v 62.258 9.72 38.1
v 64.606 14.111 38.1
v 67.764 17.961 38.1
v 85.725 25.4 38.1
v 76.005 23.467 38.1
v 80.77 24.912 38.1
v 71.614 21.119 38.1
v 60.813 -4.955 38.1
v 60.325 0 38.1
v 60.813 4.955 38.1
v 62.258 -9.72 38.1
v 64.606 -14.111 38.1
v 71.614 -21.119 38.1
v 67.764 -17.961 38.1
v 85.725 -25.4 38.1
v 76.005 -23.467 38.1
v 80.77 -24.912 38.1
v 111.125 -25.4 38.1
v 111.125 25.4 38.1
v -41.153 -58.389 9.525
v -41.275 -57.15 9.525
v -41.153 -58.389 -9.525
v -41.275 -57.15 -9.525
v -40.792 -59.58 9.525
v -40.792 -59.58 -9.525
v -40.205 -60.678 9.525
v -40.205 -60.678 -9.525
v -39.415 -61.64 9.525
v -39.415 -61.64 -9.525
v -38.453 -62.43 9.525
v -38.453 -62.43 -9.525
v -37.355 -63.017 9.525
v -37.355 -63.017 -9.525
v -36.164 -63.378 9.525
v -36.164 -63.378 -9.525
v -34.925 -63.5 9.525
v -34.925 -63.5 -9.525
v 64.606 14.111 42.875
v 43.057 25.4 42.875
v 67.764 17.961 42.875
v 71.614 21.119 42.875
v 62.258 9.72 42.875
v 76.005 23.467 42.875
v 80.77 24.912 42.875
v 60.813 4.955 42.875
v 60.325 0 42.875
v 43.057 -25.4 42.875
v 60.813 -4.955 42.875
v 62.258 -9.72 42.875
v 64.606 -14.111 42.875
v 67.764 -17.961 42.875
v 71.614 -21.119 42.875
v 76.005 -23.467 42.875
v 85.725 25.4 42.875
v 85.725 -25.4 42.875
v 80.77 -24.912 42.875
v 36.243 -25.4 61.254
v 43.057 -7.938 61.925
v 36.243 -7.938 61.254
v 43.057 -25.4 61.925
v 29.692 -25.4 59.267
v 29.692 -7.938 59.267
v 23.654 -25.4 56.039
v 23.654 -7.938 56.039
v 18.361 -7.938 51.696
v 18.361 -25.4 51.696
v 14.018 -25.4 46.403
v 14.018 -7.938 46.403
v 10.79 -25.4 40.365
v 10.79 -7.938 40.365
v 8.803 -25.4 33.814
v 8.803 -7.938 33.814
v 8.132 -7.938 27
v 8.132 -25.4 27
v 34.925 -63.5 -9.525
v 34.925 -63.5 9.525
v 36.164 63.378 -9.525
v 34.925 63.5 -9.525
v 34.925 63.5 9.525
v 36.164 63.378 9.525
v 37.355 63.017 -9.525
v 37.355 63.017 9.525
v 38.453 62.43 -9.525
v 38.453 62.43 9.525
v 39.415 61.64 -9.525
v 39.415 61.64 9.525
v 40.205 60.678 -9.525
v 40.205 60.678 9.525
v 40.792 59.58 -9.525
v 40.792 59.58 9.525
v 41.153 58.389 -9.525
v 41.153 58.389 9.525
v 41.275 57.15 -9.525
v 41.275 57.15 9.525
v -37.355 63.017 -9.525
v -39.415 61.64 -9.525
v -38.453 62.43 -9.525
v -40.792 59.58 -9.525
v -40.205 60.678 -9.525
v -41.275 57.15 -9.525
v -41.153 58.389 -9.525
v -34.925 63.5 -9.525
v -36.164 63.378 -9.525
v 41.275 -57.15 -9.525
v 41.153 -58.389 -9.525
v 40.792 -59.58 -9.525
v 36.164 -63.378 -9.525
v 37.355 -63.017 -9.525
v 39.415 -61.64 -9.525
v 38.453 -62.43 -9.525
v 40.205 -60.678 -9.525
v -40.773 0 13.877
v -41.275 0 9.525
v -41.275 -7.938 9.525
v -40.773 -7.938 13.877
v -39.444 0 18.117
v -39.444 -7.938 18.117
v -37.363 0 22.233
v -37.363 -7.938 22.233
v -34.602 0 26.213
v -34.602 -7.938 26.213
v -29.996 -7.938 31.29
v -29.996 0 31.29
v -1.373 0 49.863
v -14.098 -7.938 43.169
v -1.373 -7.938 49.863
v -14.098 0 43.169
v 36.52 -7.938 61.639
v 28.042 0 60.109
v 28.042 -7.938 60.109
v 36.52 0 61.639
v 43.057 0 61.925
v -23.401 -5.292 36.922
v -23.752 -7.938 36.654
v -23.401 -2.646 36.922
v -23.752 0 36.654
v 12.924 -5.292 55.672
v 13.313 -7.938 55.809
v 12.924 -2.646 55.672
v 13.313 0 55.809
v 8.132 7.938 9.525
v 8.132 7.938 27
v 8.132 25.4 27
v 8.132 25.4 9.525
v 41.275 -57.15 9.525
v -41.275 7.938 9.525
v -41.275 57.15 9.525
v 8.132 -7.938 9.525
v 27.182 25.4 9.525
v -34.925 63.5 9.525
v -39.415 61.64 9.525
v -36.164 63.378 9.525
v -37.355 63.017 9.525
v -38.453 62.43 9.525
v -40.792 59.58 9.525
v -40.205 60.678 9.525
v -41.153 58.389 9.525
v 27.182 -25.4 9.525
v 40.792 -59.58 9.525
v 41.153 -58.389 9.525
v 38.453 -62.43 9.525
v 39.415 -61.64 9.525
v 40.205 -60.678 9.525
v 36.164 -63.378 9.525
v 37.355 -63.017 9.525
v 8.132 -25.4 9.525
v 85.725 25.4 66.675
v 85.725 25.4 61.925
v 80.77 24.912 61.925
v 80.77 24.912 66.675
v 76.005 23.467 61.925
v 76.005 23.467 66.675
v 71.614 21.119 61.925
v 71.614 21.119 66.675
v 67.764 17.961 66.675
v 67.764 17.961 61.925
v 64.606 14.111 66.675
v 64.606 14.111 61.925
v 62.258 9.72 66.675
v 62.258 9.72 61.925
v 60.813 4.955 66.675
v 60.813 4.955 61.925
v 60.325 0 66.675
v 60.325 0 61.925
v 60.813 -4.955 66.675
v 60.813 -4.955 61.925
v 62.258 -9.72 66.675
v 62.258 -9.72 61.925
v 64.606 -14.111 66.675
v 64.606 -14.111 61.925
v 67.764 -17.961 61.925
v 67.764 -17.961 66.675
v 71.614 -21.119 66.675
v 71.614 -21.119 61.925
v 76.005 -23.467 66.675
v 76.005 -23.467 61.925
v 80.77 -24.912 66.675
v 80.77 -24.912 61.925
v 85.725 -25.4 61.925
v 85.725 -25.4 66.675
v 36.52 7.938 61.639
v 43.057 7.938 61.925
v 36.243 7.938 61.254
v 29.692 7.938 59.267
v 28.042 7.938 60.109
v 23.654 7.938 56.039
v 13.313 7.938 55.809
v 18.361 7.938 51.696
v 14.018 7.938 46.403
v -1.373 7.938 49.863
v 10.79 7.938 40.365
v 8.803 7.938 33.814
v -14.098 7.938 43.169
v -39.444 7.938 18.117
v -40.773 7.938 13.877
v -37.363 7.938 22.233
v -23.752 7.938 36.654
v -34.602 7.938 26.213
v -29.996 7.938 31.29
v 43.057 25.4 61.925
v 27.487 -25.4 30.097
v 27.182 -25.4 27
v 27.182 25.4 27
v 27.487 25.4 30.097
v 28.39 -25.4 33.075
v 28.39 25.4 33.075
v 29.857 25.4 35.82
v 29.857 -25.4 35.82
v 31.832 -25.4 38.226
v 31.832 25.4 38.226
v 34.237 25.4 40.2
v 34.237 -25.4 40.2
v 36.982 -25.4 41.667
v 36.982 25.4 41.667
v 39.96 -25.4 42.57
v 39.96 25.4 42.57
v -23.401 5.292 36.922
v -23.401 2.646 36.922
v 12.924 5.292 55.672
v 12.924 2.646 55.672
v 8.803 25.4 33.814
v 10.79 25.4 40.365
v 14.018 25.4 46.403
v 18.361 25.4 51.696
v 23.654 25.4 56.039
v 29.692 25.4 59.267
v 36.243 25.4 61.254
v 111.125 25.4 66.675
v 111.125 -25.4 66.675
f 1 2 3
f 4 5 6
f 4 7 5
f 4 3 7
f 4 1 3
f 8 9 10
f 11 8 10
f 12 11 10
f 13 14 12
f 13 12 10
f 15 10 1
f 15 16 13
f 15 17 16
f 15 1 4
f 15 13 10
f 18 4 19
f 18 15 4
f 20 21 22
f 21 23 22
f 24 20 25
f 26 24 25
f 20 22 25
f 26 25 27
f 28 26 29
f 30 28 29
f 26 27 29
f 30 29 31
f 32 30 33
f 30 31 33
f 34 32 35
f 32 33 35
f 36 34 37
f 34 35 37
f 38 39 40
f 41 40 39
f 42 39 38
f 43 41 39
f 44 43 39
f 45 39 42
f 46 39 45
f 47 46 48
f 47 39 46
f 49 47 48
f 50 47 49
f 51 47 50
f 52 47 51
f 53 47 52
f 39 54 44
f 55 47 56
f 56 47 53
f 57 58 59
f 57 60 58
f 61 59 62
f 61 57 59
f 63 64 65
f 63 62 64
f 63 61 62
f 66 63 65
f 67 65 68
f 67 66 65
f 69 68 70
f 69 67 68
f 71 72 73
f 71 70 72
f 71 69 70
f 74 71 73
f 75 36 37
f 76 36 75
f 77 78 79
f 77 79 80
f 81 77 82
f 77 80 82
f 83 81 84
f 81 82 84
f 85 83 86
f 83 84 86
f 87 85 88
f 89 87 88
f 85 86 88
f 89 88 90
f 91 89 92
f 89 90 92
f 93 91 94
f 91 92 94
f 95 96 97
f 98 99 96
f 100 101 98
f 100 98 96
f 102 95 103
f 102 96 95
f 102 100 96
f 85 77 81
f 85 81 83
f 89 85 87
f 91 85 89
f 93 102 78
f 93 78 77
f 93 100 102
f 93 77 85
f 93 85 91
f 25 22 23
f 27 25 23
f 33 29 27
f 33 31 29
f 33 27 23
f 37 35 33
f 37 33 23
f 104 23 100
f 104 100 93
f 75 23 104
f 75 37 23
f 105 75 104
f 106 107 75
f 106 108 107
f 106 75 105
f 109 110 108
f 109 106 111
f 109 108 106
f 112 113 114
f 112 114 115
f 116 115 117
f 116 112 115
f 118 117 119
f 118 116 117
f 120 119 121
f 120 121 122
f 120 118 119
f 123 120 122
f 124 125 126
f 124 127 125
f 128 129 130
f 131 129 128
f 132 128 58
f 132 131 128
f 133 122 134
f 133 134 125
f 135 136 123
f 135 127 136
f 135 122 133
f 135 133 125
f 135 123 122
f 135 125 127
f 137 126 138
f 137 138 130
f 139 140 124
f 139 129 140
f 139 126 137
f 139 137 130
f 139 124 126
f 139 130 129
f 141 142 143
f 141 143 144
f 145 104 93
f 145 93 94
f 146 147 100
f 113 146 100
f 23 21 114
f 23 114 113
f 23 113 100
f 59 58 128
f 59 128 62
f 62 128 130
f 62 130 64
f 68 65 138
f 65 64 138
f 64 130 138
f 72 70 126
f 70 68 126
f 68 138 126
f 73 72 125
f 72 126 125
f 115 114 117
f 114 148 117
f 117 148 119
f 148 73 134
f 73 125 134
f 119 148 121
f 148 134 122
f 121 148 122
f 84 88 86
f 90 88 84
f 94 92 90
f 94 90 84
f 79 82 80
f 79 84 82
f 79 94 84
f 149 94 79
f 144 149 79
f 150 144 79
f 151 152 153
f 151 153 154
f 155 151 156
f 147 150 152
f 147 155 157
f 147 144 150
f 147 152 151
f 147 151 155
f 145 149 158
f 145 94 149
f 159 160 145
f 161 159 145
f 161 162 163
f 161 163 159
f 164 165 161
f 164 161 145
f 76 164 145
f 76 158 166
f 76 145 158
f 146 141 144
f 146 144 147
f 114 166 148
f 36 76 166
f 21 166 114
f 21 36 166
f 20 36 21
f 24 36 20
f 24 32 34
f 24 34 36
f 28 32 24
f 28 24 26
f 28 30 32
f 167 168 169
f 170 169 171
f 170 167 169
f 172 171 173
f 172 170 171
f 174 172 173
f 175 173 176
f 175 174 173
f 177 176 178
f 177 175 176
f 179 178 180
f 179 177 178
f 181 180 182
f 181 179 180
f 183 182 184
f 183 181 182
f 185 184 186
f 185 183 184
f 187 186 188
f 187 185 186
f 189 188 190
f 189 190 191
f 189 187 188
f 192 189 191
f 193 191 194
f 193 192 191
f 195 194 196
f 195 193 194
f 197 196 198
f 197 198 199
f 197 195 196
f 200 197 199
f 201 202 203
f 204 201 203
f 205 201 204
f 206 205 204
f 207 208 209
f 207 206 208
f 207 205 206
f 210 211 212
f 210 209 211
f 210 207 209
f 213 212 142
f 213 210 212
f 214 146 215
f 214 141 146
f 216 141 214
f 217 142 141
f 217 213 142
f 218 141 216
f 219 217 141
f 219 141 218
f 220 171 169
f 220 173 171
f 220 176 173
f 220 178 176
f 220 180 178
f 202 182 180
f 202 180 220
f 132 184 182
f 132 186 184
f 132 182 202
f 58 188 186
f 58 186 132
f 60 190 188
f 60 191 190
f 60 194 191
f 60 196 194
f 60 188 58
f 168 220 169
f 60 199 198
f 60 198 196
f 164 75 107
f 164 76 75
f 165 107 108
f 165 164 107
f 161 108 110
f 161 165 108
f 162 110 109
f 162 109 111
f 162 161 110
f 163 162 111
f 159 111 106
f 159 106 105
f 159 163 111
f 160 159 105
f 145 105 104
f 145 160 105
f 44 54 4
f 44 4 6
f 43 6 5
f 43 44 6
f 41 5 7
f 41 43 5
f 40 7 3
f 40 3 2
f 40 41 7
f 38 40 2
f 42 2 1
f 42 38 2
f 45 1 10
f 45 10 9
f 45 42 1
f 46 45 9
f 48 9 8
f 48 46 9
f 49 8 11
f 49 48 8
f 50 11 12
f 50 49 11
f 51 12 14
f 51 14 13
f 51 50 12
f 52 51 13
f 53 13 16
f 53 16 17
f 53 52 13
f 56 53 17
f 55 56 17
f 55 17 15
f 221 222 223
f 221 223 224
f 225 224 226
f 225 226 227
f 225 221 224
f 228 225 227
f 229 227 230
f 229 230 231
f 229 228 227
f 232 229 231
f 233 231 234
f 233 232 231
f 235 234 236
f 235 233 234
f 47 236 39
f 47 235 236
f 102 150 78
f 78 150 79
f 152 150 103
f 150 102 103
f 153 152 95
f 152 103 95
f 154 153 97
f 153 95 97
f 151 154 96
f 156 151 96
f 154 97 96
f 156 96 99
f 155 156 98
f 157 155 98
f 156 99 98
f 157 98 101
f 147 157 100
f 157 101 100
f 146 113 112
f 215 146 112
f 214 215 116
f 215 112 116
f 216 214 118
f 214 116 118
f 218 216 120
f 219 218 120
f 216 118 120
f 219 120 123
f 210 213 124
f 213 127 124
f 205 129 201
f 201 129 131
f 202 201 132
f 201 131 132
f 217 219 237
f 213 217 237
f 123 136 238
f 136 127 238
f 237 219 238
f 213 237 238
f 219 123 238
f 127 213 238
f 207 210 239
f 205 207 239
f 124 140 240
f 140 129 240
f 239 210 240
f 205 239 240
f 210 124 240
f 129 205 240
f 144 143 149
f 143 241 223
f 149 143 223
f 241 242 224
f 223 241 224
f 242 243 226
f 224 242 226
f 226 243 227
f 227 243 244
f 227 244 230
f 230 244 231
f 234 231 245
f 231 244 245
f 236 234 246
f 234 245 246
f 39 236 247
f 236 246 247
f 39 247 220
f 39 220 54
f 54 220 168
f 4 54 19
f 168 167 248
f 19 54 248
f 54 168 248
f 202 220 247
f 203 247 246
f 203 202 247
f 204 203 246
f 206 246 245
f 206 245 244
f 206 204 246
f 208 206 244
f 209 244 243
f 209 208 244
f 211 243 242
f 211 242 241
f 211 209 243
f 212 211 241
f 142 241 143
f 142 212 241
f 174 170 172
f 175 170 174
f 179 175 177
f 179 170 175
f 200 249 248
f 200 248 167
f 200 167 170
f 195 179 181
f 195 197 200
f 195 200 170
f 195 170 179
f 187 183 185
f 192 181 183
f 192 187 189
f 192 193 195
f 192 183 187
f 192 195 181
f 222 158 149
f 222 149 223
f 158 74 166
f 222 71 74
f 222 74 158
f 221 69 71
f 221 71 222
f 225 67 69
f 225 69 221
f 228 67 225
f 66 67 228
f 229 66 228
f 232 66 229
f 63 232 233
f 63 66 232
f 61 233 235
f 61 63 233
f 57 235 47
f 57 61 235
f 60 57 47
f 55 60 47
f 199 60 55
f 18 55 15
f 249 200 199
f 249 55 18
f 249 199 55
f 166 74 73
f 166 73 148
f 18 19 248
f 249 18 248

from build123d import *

# Parameters (mm, degrees)
F1_DEPTH = 63.5
F0_W     = 25.4
F0_H     = 19.05
F2_DEPTH = 25.4
F3_DEPTH = 7.9375
F5_R     = 6.35


with BuildPart() as f1:
    # F0 (on Front) → F1 (new body, symmetric)
    with BuildSketch(Plane.XZ):
        Polygon((8.1319350704, 9.525), (-41.275, 9.525), (-41.275, -9.525), (41.275, -9.525), (41.275, 9.525), (27.1819350704, 9.525), align=None)
    extrude(amount=F1_DEPTH, both=True)

    # F0 (on Front) → F2 (join, symmetric)
    with BuildSketch(Plane.XZ):
        with BuildLine():
            Line((8.1319350704, 27.0002), (8.1319350704, 9.525))
            Line((8.1319350704, 9.525), (27.1819350704, 9.525))
            Line((27.1819350704, 9.525), (27.1819350704, 27.0002))
            ThreePointArc((27.1819350704, 27.0002), (31.8316149191, 38.2255201513), (43.0569350704, 42.8752))
            Line((43.0569350704, 42.8752), (60.325, 42.8752))
            Line((60.325, 42.8752), (60.325, 61.9252))
            Line((60.325, 61.9252), (43.0569350704, 61.9252))
            ThreePointArc((43.0569350704, 61.9252), (18.3612307375, 51.6959043329), (8.1319350704, 27.0002))
        make_face()
        Polygon((85.725, 66.675), (85.725, 61.9252), (85.725, 42.8752), (85.725, 38.1), (111.125, 38.1), (111.125, 66.675), align=None)
        with Locations((73.025, 52.4002)):
            Rectangle(F0_W, F0_H)
    extrude(amount=F2_DEPTH, both=True)

    # F0 (on Front) → F3 (join, symmetric)
    with BuildSketch(Plane.XZ):
        with BuildLine():
            add(Edge.make_bspline(
                [(-41.275, 9.525), (-40.8404879272, 39.9630628526), (24.2341663688, 63.2040128112), (43.0569350704, 61.9252)],
                knots=[0, 0, 0, 0, 99.2857302575, 99.2857302575, 99.2857302575, 99.2857302575], degree=3))
            Line((-41.275, 9.525), (8.1319350704, 9.525))
            Line((8.1319350704, 9.525), (8.1319350704, 27.0002))
            ThreePointArc((8.1319350704, 27.0002), (18.3612307375, 51.6959043329), (43.0569350704, 61.9252))
        make_face()
    extrude(amount=F3_DEPTH, both=True)

    # F0 (on Front) → F4 (revolve)
    with BuildSketch(Plane.XZ):
        Polygon((85.725, 66.675), (85.725, 61.9252), (85.725, 42.8752), (85.725, 38.1), (111.125, 38.1), (111.125, 66.675), align=None)
    revolve(axis=Axis((85.725, 0, 52.3875), (0, 0, 1)))

    # F5
    f5_edges = [f1.edges().sort_by_distance(p)[0] for p in [
        (-41.275, -63.5, 0),
        (41.275, -63.5, 0),
        (41.275, 63.5, 0),
        (-41.275, 63.5, 0),
    ]]
    fillet(f5_edges, radius=F5_R)


solid = f1.part
